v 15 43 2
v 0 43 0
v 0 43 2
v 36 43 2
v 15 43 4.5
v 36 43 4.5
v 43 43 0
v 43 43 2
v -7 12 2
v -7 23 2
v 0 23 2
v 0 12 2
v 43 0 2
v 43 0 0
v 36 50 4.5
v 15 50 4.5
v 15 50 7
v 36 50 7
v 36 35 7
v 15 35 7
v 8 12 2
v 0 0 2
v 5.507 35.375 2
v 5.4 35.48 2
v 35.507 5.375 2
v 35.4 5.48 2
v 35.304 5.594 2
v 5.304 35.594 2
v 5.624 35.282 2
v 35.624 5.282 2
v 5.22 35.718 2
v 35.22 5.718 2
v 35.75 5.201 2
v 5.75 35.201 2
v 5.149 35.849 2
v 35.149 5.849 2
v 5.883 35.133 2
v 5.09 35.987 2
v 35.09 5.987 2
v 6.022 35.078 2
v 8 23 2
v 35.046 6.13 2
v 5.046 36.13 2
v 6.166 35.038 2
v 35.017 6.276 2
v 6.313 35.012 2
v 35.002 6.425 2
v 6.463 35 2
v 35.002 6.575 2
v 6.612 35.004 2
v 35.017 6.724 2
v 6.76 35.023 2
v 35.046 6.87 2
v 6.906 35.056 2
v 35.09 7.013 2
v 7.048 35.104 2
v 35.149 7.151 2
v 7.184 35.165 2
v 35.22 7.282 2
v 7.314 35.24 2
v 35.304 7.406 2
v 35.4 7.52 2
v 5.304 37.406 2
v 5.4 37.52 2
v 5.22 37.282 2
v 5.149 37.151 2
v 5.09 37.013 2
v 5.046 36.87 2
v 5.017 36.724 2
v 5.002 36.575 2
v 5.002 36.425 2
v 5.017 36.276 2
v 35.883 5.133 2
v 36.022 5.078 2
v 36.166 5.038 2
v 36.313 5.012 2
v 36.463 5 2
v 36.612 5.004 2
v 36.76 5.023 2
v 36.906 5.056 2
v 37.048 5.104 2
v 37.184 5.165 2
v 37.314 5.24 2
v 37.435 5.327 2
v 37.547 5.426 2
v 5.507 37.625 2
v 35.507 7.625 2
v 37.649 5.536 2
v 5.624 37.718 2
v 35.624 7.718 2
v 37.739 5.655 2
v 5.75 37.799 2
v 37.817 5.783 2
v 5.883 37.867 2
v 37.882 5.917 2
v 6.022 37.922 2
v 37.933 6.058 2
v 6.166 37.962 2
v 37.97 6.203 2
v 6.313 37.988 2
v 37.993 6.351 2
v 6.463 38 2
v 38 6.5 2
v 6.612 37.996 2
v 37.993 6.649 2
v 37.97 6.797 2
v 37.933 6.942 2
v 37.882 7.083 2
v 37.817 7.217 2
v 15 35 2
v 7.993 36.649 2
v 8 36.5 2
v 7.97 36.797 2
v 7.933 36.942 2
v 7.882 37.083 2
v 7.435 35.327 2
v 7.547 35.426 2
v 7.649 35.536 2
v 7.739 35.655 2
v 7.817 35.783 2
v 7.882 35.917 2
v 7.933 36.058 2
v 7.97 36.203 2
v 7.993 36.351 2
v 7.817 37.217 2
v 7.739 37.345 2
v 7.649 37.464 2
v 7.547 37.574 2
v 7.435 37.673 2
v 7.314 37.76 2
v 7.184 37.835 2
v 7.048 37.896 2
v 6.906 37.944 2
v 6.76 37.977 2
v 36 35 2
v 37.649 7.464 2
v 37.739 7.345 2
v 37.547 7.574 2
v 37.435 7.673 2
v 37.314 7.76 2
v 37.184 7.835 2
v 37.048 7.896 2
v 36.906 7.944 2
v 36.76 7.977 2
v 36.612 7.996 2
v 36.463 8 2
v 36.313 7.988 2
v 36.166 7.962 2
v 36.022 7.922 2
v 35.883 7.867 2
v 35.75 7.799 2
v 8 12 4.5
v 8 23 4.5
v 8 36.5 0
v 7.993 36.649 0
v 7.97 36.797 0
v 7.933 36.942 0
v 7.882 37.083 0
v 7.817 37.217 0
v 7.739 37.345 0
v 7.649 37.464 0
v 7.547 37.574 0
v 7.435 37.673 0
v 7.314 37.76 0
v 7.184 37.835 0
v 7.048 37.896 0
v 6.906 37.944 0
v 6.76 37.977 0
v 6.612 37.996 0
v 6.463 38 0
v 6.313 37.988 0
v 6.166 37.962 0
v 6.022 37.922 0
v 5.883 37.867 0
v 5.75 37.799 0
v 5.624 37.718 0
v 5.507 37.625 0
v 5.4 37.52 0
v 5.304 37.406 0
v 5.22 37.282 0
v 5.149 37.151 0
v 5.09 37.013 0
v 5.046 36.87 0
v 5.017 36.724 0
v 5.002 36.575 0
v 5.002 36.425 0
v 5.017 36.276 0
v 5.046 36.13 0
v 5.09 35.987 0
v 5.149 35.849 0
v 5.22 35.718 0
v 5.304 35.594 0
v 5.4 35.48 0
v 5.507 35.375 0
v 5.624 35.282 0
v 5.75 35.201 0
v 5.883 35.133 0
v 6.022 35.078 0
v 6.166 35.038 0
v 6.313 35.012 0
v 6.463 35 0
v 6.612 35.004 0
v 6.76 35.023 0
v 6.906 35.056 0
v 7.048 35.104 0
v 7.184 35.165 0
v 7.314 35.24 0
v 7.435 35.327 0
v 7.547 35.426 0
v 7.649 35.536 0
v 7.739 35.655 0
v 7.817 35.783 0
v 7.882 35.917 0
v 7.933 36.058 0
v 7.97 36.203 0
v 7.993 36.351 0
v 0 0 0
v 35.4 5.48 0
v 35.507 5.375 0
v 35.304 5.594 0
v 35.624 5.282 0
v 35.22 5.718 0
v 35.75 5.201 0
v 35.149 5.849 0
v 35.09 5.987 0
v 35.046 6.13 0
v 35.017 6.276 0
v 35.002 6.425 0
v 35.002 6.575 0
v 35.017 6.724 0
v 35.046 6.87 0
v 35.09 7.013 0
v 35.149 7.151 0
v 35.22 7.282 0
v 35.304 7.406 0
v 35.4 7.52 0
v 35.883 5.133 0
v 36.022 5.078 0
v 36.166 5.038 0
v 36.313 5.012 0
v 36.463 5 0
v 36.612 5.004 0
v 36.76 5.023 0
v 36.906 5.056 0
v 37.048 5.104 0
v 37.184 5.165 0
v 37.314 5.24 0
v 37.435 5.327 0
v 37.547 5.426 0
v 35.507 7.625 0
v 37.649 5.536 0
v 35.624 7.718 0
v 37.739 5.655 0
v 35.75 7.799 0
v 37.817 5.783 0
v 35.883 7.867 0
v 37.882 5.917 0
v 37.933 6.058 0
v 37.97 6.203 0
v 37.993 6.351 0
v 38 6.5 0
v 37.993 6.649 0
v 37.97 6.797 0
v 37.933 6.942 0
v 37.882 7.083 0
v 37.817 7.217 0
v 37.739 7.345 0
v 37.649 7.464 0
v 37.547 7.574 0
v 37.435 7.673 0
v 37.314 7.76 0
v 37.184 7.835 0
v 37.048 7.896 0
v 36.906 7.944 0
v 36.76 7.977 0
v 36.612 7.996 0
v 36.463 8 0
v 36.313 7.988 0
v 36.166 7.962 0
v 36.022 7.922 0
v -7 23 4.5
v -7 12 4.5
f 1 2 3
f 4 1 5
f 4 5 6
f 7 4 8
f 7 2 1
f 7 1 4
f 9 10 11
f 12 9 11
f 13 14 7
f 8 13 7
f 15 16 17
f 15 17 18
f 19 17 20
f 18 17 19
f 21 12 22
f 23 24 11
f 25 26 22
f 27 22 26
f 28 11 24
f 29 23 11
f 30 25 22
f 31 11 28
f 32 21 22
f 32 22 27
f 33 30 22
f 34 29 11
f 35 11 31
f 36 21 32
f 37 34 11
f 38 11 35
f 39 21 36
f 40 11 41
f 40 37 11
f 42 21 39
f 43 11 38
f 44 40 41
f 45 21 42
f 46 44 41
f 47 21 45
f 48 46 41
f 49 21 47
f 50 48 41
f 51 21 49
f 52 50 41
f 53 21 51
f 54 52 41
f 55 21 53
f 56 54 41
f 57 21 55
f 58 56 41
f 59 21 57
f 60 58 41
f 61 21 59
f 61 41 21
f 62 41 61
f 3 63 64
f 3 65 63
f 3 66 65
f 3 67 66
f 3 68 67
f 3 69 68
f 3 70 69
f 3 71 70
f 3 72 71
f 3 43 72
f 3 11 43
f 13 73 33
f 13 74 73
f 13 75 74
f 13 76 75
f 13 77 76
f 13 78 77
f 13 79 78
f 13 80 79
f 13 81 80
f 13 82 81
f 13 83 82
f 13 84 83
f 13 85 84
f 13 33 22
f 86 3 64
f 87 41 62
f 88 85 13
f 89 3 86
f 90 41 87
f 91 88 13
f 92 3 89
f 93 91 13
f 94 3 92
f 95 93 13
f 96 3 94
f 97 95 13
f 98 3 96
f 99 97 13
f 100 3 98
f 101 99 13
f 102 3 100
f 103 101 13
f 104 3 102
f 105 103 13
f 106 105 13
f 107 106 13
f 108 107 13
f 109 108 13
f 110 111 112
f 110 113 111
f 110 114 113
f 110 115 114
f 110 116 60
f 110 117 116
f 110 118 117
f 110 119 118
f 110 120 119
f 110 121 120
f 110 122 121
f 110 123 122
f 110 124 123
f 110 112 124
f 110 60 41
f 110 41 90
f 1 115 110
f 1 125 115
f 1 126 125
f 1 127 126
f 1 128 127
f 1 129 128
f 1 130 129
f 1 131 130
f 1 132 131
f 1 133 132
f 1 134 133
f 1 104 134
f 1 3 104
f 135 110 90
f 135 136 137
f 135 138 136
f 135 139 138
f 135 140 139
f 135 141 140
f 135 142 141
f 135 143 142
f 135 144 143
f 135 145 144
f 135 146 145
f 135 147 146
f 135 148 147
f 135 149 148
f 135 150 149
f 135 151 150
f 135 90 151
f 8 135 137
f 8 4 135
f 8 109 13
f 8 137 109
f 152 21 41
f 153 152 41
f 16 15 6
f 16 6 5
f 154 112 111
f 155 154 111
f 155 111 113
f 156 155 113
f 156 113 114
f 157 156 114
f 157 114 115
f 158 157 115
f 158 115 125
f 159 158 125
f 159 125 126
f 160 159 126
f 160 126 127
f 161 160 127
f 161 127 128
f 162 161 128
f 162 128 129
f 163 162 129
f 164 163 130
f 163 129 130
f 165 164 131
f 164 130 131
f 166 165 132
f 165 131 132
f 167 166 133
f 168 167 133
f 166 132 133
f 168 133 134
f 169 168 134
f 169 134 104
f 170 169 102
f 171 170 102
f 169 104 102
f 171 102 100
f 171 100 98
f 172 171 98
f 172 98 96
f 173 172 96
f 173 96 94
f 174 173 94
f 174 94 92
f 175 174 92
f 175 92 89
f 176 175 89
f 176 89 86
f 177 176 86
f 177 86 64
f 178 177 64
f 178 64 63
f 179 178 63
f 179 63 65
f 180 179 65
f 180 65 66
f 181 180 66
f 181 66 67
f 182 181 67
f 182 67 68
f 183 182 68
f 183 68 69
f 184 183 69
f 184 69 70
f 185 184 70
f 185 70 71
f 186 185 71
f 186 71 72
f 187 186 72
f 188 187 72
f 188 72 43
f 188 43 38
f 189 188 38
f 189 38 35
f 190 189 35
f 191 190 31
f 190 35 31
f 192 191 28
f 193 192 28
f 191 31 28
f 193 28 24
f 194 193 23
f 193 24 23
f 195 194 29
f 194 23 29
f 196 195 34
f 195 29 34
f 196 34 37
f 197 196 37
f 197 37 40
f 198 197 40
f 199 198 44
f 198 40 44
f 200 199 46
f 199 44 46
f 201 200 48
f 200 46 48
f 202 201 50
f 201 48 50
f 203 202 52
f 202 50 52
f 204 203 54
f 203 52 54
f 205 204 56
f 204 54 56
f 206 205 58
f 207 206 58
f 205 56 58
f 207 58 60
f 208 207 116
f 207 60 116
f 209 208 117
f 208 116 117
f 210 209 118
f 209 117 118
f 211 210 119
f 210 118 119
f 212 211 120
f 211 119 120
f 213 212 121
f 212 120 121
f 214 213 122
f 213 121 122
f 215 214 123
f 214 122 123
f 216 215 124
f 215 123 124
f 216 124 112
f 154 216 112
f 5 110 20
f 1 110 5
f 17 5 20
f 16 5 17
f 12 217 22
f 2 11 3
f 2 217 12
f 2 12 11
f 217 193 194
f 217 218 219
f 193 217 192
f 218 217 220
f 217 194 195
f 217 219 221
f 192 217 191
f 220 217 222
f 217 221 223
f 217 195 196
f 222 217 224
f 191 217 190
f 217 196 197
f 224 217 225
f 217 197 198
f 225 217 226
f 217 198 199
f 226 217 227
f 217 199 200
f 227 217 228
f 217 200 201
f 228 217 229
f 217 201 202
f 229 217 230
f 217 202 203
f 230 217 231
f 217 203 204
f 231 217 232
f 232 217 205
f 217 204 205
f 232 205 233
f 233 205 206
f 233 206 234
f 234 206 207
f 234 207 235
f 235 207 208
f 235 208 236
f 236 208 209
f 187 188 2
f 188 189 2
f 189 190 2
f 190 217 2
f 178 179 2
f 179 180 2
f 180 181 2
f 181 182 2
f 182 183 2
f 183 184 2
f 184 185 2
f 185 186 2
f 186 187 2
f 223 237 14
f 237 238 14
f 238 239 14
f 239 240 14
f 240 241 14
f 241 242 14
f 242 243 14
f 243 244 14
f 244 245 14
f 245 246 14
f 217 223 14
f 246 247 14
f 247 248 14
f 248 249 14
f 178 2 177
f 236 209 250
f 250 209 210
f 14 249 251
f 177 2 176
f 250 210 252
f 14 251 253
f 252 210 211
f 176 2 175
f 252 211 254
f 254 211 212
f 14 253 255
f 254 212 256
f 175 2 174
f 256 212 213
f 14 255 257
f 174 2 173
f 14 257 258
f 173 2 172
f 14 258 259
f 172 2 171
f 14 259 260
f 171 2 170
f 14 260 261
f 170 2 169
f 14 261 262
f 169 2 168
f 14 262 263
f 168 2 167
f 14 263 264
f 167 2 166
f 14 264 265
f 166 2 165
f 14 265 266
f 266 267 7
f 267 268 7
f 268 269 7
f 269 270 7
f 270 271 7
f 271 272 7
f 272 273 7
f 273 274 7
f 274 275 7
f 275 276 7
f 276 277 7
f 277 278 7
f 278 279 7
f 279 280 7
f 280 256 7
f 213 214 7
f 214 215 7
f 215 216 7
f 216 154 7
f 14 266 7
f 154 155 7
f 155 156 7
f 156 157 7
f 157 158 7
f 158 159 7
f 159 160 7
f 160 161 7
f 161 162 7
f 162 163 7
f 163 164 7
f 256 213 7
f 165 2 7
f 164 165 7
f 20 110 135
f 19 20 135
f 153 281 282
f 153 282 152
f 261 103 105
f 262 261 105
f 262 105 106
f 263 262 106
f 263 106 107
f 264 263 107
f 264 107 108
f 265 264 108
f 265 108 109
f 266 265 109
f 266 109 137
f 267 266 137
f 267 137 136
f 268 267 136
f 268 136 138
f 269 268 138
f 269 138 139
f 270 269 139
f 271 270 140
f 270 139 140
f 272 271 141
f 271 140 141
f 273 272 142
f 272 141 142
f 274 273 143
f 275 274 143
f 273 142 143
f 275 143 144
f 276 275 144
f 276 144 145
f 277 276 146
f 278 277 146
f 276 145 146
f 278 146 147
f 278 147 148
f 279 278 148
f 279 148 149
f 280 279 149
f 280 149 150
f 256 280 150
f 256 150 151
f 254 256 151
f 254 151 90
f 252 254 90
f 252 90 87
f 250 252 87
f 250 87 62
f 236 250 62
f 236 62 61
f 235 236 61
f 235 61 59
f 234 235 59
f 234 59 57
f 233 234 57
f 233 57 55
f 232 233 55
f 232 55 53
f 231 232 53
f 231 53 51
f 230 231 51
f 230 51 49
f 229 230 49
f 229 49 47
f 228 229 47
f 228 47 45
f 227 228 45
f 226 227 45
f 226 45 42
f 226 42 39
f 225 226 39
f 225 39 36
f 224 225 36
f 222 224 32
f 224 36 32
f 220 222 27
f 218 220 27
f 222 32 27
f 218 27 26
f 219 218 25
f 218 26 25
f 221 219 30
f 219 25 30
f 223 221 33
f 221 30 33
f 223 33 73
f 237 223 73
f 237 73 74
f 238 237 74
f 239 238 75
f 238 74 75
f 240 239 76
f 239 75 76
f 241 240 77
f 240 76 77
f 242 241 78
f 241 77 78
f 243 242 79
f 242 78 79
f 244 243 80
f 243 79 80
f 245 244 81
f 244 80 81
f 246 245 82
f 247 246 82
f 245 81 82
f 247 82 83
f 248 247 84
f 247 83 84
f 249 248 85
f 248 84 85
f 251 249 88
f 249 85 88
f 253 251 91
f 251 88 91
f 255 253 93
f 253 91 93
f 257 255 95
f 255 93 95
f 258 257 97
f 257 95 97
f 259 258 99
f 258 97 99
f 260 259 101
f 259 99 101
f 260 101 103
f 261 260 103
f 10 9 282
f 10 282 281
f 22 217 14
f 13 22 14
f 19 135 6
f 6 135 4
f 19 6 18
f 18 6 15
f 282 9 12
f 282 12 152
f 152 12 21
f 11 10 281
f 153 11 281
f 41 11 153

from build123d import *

# Parameters (mm, degrees)
SKETCH2_W           = 43
SKETCH2_H           = 43
BOSS_EXTRUDE1_DEPTH = 2
CUT_EXTRUDE1_REACH  = 62.844
SKETCH3_R           = 1.5
CUT_EXTRUDE2_REACH  = 62.844
SKETCH4_R           = 1.5
SKETCH5_W           = 21
SKETCH5_H           = 15
BOSS_EXTRUDE2_DEPTH = 5
SKETCH6_W           = 15
SKETCH6_H           = 11
BOSS_EXTRUDE3_DEPTH = 2.5
SKETCH7_W           = 21
SKETCH7_H           = 7
CUT_EXTRUDE3_DEPTH  = 2.5


with BuildPart() as part:
    # Sketch2 → Boss-Extrude1 (new body)
    with BuildSketch(Plane.XY):
        with Locations((21.5, 21.5)):
            Rectangle(SKETCH2_W, SKETCH2_H)
    extrude(amount=BOSS_EXTRUDE1_DEPTH)

    # Sketch3 → Cut-Extrude1 (cut, up to next)
    with BuildSketch(Plane.XY.offset(2), mode=Mode.PRIVATE) as cut_extrude1_sk1:
        with Locations((6.5, 36.5)):
            Circle(SKETCH3_R)
    cut_extrude1_tool1 = extrude(cut_extrude1_sk1.sketch, amount=-CUT_EXTRUDE1_REACH, mode=Mode.PRIVATE) & part.part
    add(cut_extrude1_tool1.solids().sort_by_distance((6.5, 36.5, 2))[0], mode=Mode.SUBTRACT)

    # Sketch4 → Cut-Extrude2 (cut, up to next)
    with BuildSketch(Plane.XY.offset(2), mode=Mode.PRIVATE) as cut_extrude2_sk1:
        with Locations((36.5, 6.5)):
            Circle(SKETCH4_R)
    cut_extrude2_tool1 = extrude(cut_extrude2_sk1.sketch, amount=-CUT_EXTRUDE2_REACH, mode=Mode.PRIVATE) & part.part
    add(cut_extrude2_tool1.solids().sort_by_distance((36.5, 6.5, 2))[0], mode=Mode.SUBTRACT)

    # Sketch5 → Boss-Extrude2 (add)
    with BuildSketch(Plane.XY.offset(2)):
        with Locations((25.5, 42.5)):
            Rectangle(SKETCH5_W, SKETCH5_H)
    extrude(amount=BOSS_EXTRUDE2_DEPTH)

    # Sketch6 → Boss-Extrude3 (add)
    with BuildSketch(Plane.XY.offset(2)):
        with Locations((0.5, 17.5)):
            Rectangle(SKETCH6_W, SKETCH6_H)
    extrude(amount=BOSS_EXTRUDE3_DEPTH)

    # Sketch7 → Cut-Extrude3 (cut)
    with BuildSketch(Plane(origin=(0, 0, 2), x_dir=(-1, 0, 0), z_dir=(0, 0, -1))):
        with Locations((-25.5, 46.5)):
            Rectangle(SKETCH7_W, SKETCH7_H)
    extrude(amount=-CUT_EXTRUDE3_DEPTH, mode=Mode.SUBTRACT)


solid = part.part
